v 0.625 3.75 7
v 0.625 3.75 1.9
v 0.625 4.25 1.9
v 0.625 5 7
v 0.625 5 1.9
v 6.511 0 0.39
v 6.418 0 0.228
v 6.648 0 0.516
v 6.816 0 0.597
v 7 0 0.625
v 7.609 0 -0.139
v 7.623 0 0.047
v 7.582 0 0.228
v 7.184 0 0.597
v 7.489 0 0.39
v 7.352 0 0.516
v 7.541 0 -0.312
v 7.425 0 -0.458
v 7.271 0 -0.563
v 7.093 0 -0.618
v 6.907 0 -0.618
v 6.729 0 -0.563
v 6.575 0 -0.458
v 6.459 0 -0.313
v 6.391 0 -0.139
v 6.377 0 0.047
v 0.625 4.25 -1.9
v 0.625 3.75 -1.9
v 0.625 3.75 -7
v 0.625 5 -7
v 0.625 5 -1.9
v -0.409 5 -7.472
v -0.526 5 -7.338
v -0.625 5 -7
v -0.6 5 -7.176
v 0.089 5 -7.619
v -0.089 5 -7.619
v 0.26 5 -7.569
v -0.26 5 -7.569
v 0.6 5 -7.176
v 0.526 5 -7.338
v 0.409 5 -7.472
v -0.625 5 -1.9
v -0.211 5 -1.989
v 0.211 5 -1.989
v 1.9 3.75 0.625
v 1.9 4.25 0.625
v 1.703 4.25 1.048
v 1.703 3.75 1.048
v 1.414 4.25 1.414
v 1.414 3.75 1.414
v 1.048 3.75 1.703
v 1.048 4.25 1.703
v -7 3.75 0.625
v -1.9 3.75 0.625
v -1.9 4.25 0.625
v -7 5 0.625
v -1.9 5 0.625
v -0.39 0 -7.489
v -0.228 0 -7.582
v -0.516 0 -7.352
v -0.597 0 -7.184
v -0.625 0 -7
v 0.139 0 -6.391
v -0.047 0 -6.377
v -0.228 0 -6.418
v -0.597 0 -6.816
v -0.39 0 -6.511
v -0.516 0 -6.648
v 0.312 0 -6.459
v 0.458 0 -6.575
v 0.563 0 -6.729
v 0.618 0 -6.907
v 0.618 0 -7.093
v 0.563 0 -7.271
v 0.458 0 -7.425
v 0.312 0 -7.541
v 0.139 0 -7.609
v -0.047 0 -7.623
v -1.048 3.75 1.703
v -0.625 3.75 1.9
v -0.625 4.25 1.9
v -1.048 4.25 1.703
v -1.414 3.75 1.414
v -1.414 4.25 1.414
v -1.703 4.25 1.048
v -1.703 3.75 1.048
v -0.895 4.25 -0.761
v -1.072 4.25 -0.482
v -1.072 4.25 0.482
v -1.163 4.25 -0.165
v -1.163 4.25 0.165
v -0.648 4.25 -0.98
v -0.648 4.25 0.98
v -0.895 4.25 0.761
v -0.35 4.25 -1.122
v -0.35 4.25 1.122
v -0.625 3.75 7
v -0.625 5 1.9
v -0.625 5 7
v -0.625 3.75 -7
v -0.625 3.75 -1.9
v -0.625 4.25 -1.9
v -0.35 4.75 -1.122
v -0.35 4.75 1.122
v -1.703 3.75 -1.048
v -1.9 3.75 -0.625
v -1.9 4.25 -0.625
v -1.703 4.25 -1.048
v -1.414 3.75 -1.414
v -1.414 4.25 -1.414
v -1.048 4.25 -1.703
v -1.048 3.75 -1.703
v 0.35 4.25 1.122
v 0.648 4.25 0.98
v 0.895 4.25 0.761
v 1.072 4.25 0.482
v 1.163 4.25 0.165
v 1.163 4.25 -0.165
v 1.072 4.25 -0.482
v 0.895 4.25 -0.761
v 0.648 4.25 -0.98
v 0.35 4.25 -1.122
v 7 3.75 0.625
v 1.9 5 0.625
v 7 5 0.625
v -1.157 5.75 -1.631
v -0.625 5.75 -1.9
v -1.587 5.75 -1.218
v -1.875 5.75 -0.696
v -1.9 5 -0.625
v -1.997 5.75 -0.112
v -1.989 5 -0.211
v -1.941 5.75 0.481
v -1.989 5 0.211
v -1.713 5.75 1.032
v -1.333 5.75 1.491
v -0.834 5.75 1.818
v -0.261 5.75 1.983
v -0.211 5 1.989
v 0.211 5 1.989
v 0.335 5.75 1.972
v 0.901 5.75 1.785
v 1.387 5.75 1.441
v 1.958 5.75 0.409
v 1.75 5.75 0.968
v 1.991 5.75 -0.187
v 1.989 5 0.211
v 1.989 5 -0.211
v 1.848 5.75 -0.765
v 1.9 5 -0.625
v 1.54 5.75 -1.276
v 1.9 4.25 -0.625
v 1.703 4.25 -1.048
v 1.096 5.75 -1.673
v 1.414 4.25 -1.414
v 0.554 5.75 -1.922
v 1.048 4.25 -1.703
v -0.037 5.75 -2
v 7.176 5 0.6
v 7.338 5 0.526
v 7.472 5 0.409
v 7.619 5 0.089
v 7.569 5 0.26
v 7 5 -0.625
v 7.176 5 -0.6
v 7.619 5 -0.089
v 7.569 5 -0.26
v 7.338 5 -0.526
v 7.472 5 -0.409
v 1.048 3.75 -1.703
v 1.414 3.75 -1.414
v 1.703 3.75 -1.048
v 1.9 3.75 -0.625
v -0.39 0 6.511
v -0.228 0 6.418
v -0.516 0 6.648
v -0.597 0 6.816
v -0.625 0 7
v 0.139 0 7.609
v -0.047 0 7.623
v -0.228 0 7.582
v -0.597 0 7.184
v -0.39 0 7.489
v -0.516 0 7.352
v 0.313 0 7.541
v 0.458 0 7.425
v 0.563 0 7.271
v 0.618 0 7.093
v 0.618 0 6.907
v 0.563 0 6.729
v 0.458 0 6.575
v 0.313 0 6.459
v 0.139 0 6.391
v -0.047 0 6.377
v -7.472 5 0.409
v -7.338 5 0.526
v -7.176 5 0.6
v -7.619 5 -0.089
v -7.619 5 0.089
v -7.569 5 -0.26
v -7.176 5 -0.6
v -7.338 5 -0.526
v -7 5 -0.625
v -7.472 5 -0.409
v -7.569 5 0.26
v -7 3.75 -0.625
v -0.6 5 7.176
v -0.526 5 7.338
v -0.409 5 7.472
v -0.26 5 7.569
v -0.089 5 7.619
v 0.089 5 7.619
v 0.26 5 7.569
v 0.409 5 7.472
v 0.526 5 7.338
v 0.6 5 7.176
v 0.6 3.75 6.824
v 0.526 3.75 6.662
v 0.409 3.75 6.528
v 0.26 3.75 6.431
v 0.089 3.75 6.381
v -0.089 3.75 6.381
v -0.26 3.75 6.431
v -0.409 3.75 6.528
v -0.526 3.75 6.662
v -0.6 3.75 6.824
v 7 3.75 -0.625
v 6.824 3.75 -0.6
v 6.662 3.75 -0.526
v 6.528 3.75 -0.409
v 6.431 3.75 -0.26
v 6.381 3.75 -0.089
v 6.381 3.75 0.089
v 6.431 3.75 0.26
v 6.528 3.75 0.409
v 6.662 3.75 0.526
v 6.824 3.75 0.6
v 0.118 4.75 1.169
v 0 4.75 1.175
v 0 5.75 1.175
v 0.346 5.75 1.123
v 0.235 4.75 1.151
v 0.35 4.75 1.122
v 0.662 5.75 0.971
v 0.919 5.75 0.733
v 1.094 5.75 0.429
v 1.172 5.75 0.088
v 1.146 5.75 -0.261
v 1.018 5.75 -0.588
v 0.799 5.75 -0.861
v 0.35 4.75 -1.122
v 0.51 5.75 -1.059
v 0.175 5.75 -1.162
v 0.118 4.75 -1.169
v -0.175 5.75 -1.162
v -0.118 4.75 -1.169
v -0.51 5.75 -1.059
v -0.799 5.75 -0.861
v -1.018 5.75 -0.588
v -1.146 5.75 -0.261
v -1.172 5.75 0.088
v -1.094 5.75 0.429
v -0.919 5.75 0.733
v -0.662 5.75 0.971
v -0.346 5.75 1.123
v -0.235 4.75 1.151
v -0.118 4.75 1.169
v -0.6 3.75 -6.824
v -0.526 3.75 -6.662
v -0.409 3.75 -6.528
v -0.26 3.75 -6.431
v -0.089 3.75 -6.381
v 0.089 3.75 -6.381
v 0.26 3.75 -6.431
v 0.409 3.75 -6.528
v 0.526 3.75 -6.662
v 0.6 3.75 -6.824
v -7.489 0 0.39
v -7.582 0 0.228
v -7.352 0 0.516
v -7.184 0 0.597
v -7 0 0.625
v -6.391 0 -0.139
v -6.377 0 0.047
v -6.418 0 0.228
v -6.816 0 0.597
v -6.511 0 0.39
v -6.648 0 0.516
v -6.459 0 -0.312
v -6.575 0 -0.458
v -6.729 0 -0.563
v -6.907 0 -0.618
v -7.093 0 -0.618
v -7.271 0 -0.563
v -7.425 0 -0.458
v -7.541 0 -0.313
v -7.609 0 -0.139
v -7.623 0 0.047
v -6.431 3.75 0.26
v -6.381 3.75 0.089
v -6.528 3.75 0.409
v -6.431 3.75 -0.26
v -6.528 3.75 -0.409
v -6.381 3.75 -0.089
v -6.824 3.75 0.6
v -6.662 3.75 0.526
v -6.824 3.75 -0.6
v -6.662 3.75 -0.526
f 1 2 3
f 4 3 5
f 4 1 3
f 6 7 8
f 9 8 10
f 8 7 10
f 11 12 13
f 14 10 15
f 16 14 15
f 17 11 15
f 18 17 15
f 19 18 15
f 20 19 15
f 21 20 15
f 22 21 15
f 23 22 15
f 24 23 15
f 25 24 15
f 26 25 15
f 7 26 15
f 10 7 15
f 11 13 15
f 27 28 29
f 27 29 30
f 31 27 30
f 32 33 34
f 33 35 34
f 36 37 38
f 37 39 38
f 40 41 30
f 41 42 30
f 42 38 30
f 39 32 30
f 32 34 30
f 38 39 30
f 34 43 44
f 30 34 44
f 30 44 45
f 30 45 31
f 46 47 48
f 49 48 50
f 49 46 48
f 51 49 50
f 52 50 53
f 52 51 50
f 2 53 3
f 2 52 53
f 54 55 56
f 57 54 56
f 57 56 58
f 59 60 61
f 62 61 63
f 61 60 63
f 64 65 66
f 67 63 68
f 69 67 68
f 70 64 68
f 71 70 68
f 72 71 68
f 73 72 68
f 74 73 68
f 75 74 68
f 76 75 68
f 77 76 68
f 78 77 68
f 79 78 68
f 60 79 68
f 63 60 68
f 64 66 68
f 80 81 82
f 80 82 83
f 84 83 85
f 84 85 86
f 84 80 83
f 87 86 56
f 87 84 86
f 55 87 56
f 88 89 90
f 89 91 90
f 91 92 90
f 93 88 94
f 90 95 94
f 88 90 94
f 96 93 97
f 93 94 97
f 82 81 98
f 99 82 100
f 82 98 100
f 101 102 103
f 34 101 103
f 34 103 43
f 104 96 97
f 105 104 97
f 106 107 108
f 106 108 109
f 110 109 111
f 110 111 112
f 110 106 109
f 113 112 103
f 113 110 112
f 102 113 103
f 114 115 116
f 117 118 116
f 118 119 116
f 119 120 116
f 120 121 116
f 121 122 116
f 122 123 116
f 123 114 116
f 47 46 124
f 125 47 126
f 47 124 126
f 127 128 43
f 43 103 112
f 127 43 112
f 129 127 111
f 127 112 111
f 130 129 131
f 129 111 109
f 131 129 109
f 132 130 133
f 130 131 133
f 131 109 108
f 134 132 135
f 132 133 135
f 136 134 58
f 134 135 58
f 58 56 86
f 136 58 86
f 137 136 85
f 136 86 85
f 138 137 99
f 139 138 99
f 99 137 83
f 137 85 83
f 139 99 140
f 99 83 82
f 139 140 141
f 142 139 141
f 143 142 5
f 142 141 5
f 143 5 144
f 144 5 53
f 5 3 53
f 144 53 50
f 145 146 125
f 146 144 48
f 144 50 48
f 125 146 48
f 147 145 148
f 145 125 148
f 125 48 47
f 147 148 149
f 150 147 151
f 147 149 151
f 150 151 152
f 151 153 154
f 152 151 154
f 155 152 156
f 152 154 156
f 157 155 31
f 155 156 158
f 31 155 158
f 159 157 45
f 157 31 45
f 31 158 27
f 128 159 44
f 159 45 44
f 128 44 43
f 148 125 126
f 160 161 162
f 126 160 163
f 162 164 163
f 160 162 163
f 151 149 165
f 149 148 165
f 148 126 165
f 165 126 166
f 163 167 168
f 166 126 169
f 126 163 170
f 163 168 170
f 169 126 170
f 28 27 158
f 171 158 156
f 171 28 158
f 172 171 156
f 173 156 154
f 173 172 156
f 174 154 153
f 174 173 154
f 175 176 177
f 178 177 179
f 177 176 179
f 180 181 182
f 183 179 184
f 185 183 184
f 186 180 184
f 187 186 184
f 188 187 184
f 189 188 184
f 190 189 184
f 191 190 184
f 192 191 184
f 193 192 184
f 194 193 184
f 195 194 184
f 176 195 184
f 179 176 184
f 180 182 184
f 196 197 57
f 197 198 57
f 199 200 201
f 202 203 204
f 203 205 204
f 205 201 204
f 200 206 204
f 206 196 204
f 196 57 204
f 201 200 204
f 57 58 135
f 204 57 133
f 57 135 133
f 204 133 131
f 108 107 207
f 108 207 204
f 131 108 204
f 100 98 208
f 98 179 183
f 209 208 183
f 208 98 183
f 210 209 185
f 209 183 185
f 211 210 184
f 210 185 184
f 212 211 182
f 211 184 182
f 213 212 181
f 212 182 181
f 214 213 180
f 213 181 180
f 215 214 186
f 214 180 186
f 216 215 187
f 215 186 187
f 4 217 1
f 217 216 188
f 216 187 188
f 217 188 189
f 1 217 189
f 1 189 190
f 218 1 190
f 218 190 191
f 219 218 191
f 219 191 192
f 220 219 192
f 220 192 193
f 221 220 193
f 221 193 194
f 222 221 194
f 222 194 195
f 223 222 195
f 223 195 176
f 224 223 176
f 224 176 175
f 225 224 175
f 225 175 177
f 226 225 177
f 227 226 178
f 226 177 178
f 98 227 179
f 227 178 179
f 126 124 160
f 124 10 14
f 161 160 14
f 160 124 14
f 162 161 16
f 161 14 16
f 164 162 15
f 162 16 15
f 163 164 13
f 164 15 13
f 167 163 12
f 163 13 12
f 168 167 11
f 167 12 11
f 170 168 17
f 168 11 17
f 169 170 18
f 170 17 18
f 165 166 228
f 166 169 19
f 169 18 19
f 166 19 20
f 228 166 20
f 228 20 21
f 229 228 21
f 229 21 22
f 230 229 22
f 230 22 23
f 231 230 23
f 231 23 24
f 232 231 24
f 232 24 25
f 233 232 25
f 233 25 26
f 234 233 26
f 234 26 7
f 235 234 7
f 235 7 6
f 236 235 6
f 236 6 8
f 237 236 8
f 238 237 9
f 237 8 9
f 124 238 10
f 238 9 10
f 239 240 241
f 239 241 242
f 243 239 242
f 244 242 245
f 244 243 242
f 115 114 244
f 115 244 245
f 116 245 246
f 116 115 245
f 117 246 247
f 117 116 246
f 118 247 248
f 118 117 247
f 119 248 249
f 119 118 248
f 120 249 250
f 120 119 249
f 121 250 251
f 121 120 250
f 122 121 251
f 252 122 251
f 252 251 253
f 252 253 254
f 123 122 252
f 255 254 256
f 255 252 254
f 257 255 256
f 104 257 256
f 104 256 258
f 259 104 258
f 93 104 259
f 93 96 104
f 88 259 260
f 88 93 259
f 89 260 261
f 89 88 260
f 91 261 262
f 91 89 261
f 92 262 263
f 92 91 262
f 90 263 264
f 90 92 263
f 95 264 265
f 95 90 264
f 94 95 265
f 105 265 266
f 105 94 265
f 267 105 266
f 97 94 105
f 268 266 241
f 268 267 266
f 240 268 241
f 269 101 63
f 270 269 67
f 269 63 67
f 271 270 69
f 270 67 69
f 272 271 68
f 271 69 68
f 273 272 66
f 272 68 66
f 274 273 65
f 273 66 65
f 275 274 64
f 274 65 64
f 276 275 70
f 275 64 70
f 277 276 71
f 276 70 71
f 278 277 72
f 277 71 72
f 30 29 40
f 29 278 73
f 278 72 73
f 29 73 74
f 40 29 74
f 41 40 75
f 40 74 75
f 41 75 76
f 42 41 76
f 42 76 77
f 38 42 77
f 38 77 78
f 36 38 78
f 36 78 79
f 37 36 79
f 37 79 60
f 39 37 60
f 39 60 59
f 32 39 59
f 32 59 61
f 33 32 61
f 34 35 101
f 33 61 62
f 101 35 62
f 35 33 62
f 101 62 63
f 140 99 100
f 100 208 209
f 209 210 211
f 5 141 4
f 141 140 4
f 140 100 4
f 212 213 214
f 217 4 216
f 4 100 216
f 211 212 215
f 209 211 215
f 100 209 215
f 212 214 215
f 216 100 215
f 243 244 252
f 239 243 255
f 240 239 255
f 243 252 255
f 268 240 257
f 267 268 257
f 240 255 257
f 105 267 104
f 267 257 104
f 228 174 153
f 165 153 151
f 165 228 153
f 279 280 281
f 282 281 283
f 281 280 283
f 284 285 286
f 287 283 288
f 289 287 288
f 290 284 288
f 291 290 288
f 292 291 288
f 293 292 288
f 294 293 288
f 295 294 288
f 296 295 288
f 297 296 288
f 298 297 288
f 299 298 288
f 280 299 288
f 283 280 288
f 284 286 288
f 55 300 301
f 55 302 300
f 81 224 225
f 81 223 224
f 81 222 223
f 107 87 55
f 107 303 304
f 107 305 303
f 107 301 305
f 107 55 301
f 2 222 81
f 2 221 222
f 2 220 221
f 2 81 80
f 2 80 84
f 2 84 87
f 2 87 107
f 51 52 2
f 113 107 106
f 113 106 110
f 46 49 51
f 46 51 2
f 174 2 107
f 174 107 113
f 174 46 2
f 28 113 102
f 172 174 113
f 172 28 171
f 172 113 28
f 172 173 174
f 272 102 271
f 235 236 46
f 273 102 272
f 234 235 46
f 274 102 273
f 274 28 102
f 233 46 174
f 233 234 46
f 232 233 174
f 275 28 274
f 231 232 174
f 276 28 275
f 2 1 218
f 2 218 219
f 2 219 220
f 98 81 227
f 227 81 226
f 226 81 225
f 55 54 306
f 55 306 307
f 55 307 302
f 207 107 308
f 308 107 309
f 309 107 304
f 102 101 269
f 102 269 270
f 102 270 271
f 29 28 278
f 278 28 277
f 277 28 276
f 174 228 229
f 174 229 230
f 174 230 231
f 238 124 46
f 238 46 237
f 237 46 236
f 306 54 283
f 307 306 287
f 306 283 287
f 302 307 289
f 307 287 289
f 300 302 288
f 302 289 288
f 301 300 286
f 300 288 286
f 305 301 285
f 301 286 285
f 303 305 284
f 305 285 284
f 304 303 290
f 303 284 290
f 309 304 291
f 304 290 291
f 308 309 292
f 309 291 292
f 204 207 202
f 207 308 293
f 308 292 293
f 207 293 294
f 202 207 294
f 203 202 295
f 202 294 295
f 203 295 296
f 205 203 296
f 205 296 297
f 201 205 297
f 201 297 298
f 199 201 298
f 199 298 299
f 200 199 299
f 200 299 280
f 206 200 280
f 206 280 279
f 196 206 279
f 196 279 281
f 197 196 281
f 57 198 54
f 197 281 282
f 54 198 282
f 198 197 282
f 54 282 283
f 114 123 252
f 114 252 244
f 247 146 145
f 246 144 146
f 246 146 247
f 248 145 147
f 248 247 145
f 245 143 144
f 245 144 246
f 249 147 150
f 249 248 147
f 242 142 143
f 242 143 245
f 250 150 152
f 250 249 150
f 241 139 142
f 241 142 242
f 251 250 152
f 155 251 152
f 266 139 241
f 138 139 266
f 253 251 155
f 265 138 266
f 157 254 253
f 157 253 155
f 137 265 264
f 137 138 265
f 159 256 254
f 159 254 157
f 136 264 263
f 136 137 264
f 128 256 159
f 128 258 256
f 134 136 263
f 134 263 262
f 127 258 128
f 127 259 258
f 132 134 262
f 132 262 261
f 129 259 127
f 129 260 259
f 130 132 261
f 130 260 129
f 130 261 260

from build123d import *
from build123d.topology import SkipClean

# Parameters (mm, degrees)
SKETCH1_R                            = 0.625
BOSS_EXTRUDE1_DEPTH                  = 5
BOSS_EXTRUDE1_2_DEPTH                = 5
BOSS_EXTRUDE2_REACH                  = 11.14
BOSS_EXTRUDE2_END_RADIUS             = 0.625
SKETCH2_W                            = 1.25
SKETCH2_H                            = 1.25
BOSS_EXTRUDE2_DIRECTION_2_REACH      = 11.14
BOSS_EXTRUDE2_DIRECTION_2_END_RADIUS = 0.625
CIRPATTERN4_COUNT                    = 2
CIRPATTERN4_ANGLE                    = 90
SKETCH7_R                            = 1.5
CUT_EXTRUDE1_DEPTH                   = 1.25
SKETCH8_R                            = 2
BOSS_EXTRUDE4_DEPTH                  = 0.5
SKETCH9_R                            = 2
SKETCH9_R_2                          = 1.175
BOSS_EXTRUDE5_DEPTH                  = 1.5
BOSS_EXTRUDE6_DEPTH                  = 0.5


with BuildPart() as part:
    # Sketch1 → Boss-Extrude1 (new body)
    with BuildSketch(Plane(origin=(0, 0, 0), x_dir=(1, 0, 0), z_dir=(0, 1, 0))):
        with Locations(Location((-7, 0, 0), (0, 0, 270))):
            Circle(SKETCH1_R)
    extrude(amount=BOSS_EXTRUDE1_DEPTH)



with BuildPart() as body_2:
    # Sketch1 → Boss-Extrude1 2 (new body)
    with BuildSketch(Plane(origin=(0, 0, 0), x_dir=(1, 0, 0), z_dir=(0, 1, 0))):
        with Locations(Location((7, 0, 0), (0, 0, 270))):
            Circle(SKETCH1_R)
    extrude(amount=BOSS_EXTRUDE1_2_DEPTH)


with BuildPart() as part_1:
    add(part.part)

    add(body_2.part)  # Boss-Extrude2 merges body 2
    # Boss-Extrude2: up to this cylinder (the profile starts outside it)
    boss_extrude2_end = Plane(origin=(7, 4.375, 0), z_dir=(0, -1, 0)) * Cylinder(BOSS_EXTRUDE2_END_RADIUS, 24.53, mode=Mode.PRIVATE)
    # Sketch2 → Boss-Extrude2 (add, up to the surface)
    with BuildSketch(Plane(origin=(0, 0, 0), x_dir=(0, 0, -1), z_dir=(1, 0, 0)), mode=Mode.PRIVATE) as boss_extrude2_sk1:
        with Locations((0, 4.375)):
            Rectangle(SKETCH2_W, SKETCH2_H)
    boss_extrude2_tool1 = extrude(boss_extrude2_sk1.sketch, amount=BOSS_EXTRUDE2_REACH, mode=Mode.PRIVATE) - boss_extrude2_end
    add(boss_extrude2_tool1.solids().sort_by_distance((0, 4.375, 0))[0])

    # Boss-Extrude2 direction 2: up to this cylinder (the profile starts outside it)
    boss_extrude2_direction_2_end = Plane(origin=(-7, 4.375, 0), z_dir=(0, -1, 0)) * Cylinder(BOSS_EXTRUDE2_DIRECTION_2_END_RADIUS, 24.53, mode=Mode.PRIVATE)
    # Sketch2 → Boss-Extrude2 direction 2 (add, up to the surface)
    with BuildSketch(Plane(origin=(0, 0, 0), x_dir=(0, 0, -1), z_dir=(1, 0, 0)), mode=Mode.PRIVATE) as boss_extrude2_direction_2_sk1:
        with Locations((0, 4.375)):
            Rectangle(SKETCH2_W, SKETCH2_H)
    boss_extrude2_direction_2_tool1 = extrude(boss_extrude2_direction_2_sk1.sketch, amount=-BOSS_EXTRUDE2_DIRECTION_2_REACH, mode=Mode.PRIVATE) - boss_extrude2_direction_2_end
    add(boss_extrude2_direction_2_tool1.solids().sort_by_distance((0, 4.375, 0))[0])


with BuildPart() as cirpattern4_1:
    # CirPattern4: pattern copy
    add(part_1.part.rotate(Axis((0, 0, 0), (0, -1, 0)), 1 * CIRPATTERN4_ANGLE / (CIRPATTERN4_COUNT - 1)))


with BuildPart() as cut_extrude1_tool:
    # Sketch7 → Cut-Extrude1 (new body)
    with BuildSketch(Plane(origin=(0, 5, 0), x_dir=(1, 0, 0), z_dir=(0, 1, 0))):
        Circle(SKETCH7_R)
    extrude(amount=-CUT_EXTRUDE1_DEPTH)


with BuildPart() as part_2:
    add(part_1.part)

    # Cut-Extrude1: cut by cut_extrude1_tool
    add(cut_extrude1_tool.part, mode=Mode.SUBTRACT)


with BuildPart() as cirpattern4_1_1:
    add(cirpattern4_1.part)

    # Cut-Extrude1: cut by cut_extrude1_tool
    add(cut_extrude1_tool.part, mode=Mode.SUBTRACT)


with BuildPart() as cut_extrude1_piece_1:
    # of the separate pieces the step leaves, piece 1, a body of its own (cut_extrude1_pieces)
    add(part_2.part.solids().sort_by_distance((1.363589014, 5, -0.625))[0])



with BuildPart() as cut_extrude1_piece_2:
    # of the separate pieces the step leaves, piece 2, a body of its own (cut_extrude1_pieces)
    add(part_2.part.solids().sort_by_distance((-7, 5, -0.625))[0])


with BuildPart() as cut_extrude1_piece_1_of_cirpattern4_1:
    # of the separate pieces the step leaves, piece 1, a body of its own (cut_extrude1_pieces_of_cirpattern4_1)
    add(cirpattern4_1_1.part.solids().sort_by_distance((-0.625, 5, 1.363589014))[0])


with BuildPart() as cut_extrude1_piece_2_of_cirpattern4_1:
    # of the separate pieces the step leaves, piece 2, a body of its own (cut_extrude1_pieces_of_cirpattern4_1)
    add(cirpattern4_1_1.part.solids().sort_by_distance((0.625, 5, -7))[0])


with BuildPart() as cut_extrude1_piece_1_1:
    add(cut_extrude1_piece_1.part)

    add(cut_extrude1_piece_2.part)  # Boss-Extrude4 merges Cut-Extrude1 piece 2

    add(cut_extrude1_piece_1_of_cirpattern4_1.part)  # Boss-Extrude4 merges Cut-Extrude1 piece 1 of CirPattern4_1

    add(cut_extrude1_piece_2_of_cirpattern4_1.part)  # Boss-Extrude4 merges Cut-Extrude1 piece 2 of CirPattern4_1
    # Sketch8 → Boss-Extrude4 (add)
    with BuildSketch(Plane.XZ.offset(-3.75)):
        Circle(SKETCH8_R)
    extrude(amount=-BOSS_EXTRUDE4_DEPTH)

    # Sketch9 → Boss-Extrude5 (add)
    with SkipClean():  # the faces are left unmerged after this step: merging them gives an invalid solid
        with BuildSketch(Plane(origin=(0, 4.25, 0), x_dir=(1, 0, 0), z_dir=(0, 1, 0))):
            with Locations(Location((0, 0, 0), (0, 0, 108.209956864))):
                Circle(SKETCH9_R)
            with Locations(Location((0, 0, 0), (0, 0, 270))):
                Circle(SKETCH9_R_2, mode=Mode.SUBTRACT)
        extrude(amount=BOSS_EXTRUDE5_DEPTH)

    # Sketch11 → Boss-Extrude6 (add)
    with SkipClean():  # the faces are left unmerged after this step: merging them gives an invalid solid
        with BuildSketch(Plane(origin=(0, 4.25, 0), x_dir=(1, 0, 0), z_dir=(0, 1, 0))):
            with BuildLine():
                Line((-0.35, 0), (-0.35, 1.121661714))
                ThreePointArc((-0.35, 1.121661714), (0, 1.175), (0.35, 1.121661714))
                Line((0.35, 1.121661714), (0.35, -1.121661714))
                ThreePointArc((0.35, -1.121661714), (0, -1.175), (-0.35, -1.121661714))
                Line((-0.35, -1.121661714), (-0.35, 0))
            make_face()
        extrude(amount=BOSS_EXTRUDE6_DEPTH)


solid = cut_extrude1_piece_1_1.part
